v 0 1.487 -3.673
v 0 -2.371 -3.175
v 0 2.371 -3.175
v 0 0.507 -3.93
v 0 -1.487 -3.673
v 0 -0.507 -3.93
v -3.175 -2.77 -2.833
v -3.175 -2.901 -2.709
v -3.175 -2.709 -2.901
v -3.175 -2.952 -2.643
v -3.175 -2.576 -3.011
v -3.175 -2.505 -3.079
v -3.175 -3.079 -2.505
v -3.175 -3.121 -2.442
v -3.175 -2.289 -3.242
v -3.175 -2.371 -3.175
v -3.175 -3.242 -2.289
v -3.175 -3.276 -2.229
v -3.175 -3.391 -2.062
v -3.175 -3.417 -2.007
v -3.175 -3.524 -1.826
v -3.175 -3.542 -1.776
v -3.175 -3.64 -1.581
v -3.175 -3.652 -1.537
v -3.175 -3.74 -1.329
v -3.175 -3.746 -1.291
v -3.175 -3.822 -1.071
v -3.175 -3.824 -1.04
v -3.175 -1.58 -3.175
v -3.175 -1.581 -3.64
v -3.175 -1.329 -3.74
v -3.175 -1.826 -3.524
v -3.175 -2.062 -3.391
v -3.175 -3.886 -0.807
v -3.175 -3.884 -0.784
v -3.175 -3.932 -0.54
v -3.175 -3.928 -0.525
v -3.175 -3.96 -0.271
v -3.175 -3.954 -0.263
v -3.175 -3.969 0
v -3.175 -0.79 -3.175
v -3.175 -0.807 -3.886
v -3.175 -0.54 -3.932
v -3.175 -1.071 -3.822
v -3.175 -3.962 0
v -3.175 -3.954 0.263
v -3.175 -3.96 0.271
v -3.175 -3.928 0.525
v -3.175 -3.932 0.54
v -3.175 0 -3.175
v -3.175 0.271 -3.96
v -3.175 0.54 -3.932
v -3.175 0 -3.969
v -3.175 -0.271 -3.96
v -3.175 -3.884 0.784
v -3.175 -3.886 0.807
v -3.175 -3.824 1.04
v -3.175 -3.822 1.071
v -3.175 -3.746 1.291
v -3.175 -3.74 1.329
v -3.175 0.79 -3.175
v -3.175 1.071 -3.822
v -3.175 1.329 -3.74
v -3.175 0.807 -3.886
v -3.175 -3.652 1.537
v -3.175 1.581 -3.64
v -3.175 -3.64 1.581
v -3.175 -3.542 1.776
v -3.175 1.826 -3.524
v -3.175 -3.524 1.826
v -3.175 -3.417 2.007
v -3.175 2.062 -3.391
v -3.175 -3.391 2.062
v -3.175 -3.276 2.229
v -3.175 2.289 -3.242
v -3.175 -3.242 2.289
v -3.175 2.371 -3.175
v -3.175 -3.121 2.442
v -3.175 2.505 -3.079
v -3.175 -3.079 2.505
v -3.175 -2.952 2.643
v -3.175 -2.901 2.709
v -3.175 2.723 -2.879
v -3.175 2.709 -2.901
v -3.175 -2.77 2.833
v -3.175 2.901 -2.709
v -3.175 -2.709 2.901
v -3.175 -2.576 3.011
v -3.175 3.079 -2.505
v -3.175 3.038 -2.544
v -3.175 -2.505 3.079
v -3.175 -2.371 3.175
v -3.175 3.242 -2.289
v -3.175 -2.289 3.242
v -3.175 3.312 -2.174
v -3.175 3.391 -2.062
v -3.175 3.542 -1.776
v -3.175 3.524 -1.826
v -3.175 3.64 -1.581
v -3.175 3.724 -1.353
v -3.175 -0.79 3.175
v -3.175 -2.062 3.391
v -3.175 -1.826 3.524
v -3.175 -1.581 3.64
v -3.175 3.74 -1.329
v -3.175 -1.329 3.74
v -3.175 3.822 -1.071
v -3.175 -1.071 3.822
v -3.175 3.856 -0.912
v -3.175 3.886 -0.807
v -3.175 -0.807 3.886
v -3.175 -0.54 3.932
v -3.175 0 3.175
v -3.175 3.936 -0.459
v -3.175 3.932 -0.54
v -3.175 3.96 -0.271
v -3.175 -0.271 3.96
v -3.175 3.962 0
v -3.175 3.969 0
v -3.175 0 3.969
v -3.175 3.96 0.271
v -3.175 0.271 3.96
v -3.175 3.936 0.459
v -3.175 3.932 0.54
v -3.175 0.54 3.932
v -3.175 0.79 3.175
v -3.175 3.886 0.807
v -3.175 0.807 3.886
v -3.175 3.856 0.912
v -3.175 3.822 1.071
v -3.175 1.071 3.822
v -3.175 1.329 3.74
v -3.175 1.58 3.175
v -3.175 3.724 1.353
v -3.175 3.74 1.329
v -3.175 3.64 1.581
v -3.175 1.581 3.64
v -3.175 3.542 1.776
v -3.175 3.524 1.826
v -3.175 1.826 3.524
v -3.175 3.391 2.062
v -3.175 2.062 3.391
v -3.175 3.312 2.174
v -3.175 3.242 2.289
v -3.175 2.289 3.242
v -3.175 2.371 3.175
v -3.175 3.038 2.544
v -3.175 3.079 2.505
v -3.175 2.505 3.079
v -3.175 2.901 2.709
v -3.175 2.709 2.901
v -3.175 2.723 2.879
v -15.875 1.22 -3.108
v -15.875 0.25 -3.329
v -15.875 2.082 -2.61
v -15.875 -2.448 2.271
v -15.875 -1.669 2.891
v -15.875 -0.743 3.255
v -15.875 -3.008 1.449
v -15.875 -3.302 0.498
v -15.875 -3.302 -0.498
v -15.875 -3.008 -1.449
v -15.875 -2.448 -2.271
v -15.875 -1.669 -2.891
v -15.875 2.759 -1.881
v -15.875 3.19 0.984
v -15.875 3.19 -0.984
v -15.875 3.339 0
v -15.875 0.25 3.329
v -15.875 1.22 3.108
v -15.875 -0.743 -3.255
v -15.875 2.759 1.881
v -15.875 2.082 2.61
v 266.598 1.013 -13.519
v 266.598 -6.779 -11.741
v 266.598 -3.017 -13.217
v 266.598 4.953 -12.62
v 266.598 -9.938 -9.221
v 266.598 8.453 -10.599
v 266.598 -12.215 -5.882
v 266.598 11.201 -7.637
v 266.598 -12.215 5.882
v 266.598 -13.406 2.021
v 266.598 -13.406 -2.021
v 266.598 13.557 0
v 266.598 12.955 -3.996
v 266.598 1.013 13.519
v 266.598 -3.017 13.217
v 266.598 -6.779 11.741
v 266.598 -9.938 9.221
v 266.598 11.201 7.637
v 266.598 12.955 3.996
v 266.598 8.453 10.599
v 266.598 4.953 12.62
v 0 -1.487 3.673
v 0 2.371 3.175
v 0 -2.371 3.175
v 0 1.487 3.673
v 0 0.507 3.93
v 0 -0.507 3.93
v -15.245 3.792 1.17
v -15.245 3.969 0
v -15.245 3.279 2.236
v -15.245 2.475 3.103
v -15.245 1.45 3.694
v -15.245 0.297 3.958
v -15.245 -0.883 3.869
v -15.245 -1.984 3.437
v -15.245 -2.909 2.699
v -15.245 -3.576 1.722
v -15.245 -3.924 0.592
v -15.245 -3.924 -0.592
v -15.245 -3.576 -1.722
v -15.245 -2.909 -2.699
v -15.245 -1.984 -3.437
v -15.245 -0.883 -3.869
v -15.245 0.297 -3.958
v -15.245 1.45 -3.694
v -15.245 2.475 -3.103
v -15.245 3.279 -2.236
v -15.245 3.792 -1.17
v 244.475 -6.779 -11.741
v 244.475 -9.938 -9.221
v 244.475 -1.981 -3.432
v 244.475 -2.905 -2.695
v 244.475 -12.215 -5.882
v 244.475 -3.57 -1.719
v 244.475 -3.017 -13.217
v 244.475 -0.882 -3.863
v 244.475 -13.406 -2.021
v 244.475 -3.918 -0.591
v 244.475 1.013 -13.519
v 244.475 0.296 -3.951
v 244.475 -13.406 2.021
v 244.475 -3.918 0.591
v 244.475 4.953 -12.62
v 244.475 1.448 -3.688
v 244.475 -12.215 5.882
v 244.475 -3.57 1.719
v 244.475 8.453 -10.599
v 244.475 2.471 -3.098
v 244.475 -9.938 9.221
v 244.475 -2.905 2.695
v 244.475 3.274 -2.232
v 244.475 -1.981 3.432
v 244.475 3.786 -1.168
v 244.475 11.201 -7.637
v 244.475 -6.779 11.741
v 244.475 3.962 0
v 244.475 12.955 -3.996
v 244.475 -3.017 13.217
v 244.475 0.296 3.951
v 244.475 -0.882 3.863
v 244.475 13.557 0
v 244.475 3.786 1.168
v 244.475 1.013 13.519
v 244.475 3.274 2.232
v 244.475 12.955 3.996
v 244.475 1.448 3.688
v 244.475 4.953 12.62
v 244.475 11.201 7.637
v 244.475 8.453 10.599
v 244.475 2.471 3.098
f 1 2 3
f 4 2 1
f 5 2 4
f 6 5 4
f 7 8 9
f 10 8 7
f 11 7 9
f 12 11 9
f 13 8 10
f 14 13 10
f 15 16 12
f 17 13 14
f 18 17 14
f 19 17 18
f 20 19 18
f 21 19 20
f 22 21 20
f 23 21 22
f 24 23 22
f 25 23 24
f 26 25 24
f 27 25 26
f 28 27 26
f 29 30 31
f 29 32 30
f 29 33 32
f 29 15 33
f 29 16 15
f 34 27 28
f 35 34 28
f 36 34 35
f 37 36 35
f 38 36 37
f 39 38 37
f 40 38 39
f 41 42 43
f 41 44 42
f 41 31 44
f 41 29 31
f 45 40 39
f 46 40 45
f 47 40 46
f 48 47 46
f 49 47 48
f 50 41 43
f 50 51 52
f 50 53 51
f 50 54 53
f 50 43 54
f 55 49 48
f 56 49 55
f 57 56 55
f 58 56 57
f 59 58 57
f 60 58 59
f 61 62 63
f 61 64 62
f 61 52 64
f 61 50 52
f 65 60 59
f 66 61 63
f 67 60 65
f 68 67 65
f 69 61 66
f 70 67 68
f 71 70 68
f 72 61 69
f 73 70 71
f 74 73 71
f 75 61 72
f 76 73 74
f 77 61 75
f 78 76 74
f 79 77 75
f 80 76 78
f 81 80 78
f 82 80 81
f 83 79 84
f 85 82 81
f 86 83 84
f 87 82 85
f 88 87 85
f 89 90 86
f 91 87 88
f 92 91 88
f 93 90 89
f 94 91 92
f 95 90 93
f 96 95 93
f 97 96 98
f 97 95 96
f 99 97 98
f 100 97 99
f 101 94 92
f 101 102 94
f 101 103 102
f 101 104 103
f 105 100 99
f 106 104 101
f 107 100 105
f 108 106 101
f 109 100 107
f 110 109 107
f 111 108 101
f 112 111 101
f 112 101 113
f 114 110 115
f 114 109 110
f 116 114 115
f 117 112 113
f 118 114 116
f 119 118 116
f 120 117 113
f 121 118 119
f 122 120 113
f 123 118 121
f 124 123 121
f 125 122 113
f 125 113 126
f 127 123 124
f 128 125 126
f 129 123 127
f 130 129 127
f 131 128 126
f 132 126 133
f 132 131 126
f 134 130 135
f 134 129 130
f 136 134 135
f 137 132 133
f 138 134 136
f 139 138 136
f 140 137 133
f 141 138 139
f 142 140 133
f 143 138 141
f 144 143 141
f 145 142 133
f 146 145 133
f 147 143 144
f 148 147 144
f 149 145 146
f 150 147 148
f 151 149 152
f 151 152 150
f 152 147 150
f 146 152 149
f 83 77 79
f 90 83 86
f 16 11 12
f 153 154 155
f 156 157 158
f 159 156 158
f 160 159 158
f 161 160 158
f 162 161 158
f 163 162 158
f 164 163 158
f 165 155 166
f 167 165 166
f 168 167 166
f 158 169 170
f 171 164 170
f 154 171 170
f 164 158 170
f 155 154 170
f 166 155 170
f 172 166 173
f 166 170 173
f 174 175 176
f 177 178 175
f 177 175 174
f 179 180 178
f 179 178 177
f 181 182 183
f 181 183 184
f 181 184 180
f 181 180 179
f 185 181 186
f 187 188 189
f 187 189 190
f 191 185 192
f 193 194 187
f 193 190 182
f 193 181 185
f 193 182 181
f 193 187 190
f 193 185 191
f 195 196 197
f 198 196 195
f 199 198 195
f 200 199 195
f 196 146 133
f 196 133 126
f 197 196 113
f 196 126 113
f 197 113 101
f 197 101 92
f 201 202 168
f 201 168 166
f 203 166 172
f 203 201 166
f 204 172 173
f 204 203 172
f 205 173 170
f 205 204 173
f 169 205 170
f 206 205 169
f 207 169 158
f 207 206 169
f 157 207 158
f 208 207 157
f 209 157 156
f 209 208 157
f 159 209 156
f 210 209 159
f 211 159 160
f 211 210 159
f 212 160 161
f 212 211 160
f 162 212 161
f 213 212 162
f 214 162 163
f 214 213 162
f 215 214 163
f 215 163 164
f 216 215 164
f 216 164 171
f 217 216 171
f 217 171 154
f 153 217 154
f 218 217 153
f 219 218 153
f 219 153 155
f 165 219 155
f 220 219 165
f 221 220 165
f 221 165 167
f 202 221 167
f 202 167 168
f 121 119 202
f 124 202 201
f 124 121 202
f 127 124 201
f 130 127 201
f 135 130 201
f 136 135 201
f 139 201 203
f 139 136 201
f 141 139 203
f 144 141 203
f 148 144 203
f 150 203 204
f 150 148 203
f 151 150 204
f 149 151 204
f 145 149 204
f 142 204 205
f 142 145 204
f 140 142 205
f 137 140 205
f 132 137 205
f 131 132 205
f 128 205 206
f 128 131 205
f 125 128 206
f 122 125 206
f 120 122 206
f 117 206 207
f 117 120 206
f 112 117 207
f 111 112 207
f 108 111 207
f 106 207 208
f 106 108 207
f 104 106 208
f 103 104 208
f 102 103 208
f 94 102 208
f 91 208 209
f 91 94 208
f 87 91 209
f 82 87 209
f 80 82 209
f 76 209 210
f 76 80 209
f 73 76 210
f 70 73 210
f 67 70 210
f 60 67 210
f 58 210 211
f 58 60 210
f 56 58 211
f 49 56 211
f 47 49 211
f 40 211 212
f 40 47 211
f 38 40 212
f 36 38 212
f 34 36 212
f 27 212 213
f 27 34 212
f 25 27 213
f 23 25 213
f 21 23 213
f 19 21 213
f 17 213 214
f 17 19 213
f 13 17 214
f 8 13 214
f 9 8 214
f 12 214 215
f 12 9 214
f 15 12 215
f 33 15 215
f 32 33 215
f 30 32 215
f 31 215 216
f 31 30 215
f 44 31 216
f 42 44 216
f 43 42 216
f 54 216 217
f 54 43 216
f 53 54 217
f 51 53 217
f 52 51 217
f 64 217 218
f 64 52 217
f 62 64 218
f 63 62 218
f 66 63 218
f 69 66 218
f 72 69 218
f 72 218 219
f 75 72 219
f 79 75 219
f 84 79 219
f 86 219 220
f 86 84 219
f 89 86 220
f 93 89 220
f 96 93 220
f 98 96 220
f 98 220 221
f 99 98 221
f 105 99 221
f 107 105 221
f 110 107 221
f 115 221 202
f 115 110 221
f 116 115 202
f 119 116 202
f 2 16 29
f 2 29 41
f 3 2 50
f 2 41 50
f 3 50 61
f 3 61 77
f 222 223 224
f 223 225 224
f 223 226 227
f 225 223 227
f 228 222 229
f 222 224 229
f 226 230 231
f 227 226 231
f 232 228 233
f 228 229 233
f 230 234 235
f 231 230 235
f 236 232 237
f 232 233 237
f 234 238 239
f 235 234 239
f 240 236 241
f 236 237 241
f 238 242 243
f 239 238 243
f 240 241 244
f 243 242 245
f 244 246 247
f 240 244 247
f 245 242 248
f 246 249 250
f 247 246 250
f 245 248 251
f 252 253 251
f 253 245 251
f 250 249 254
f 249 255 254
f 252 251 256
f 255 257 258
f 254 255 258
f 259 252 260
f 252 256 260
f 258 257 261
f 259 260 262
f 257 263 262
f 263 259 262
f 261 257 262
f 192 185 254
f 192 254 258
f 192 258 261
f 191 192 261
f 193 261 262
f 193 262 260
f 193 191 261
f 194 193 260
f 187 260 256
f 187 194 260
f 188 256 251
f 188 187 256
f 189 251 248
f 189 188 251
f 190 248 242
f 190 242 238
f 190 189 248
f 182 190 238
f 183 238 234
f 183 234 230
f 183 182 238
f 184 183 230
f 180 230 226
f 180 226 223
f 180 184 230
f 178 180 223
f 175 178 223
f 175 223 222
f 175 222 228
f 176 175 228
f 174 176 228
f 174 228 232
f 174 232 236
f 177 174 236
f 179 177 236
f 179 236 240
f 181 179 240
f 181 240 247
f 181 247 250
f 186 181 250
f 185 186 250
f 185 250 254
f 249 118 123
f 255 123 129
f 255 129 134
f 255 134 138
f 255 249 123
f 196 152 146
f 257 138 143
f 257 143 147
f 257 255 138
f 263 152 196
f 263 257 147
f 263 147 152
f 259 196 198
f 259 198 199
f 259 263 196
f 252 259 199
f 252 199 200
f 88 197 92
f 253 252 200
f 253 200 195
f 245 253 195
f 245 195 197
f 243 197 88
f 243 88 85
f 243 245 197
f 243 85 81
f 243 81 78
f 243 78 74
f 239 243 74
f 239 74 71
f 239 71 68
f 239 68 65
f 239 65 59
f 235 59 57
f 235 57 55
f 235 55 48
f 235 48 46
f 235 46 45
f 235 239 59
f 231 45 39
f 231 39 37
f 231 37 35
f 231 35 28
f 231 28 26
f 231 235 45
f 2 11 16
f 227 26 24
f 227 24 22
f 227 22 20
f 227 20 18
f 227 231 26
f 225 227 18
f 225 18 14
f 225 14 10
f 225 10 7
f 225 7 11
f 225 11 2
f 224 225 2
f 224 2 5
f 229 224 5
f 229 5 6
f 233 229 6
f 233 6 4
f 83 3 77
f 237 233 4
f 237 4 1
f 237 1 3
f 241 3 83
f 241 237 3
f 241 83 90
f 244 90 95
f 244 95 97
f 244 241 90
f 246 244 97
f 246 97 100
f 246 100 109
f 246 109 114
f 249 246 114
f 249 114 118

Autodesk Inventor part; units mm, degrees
sketch "Sketch_1" plane through (0, 0, 0) normal (0, 0, 1) x (1, 0, 0)
  line L0 (266.5984, 0) -> (-3.175, 0)
  line L1 (-3.175, 0) -> (-3.175, 3.9624)
  line L2 (-3.175, 3.9624) -> (244.475, 3.9624)
  line L3 (244.475, 3.9624) -> (244.475, 13.5572)
  line L4 (244.475, 13.5572) -> (266.5984, 13.5572)
  line L5 (266.5984, 13.5572) -> (266.5984, 0)
  line L6 (266.5984, 0) -> (-3.175, 0)
revolve "Revolution1" add sketch "Sketch_1" angle 360 about axis through (266.5984, 0, 0) along (1, 0, 0)
sketch "Sketch_3" plane through (0, 0, 0) normal (0, 0, 1) x (1, 0, 0)
  line L0 (-3.175, 0) -> (-15.875, 0)
  line L1 (-15.875, 0) -> (-15.875, 3.3388)
  line L2 (-15.875, 3.3388) -> (-15.2451, 3.9688)
  line L3 (-15.2451, 3.9688) -> (-3.175, 3.9688)
  line L4 (-3.175, 3.9688) -> (-3.175, 0)
  line L5 (-3.175, 0) -> (-15.875, 0)
revolve "Revolution2" add sketch "Sketch_3" angle 360 about axis through (-3.175, 0, 0) along (1, 0, 0)
thread "Thread1" size "5/16-24 UNF" class "2A" standard "ANSI Unified Screw Threads" full length
sketch "Sketch_10" plane through (-3.175, 0, 0) normal (1, 0, 0) x (0, 0, -1)
  line L0 (-7.9248, 7.9248) -> (-7.9248, -7.9248)
  line L1 (-7.9248, -7.9248) -> (7.9248, -7.9248)
  line L2 (7.9248, -7.9248) -> (7.9248, 7.9248)
  line L3 (7.9248, 7.9248) -> (-7.9248, 7.9248)
  line L4 (-3.175, 3.9624) -> (-3.175, -3.9624)
  line L5 (-3.175, -3.9624) -> (3.175, -3.9624)
  line L6 (3.175, -3.9624) -> (3.175, 3.9624)
  line L7 (3.175, 3.9624) -> (-3.175, 3.9624)
extrude "Extrusion1" cut sketch "Sketch_10" along normal blind 3.175
ref_plane "dia1_XY" through (-3.175, 3.9624, 0) normal (1, 0, 0) x (0, 0, -1)
ref_plane "dia1_YZ" through (-3.175, 3.9624, 0) normal (0, 0, -1) x (0, 1, 0)
ref_plane "dia1_ZX" through (-3.175, 3.9624, 0) normal (0, 1, 0) x (1, 0, 0)
ref_plane "dia12_XY" through (0, 0, 14.1351) normal (1, 0, 0) x (0, 0, -1)
ref_plane "dia12_YZ" through (0, 0, 14.1351) normal (0, 0, -1) x (0, 1, 0)
ref_plane "dia12_ZX" through (0, 0, 14.1351) normal (0, 1, 0) x (1, 0, 0)
ref_plane "dia2_XY" through (-3.175, -3.9624, 0) normal (1, 0, 0) x (0, 0, -1)
ref_plane "dia2_YZ" through (-3.175, -3.9624, 0) normal (0, 0, -1) x (0, 1, 0)
ref_plane "dia2_ZX" through (-3.175, -3.9624, 0) normal (0, 1, 0) x (1, 0, 0)
ref_plane "dia22_XY" through (0, 0, -14.1351) normal (1, 0, 0) x (0, 0, -1)
ref_plane "dia22_YZ" through (0, 0, -14.1351) normal (0, 0, -1) x (0, 1, 0)
ref_plane "dia22_ZX" through (0, 0, -14.1351) normal (0, 1, 0) x (1, 0, 0)
ref_plane "rl1_XY" through (-15.875, 0, 0) normal (1, 0, 0) x (0, 0, -1)
ref_plane "rl1_YZ" through (-15.875, 0, 0) normal (0, 0, -1) x (0, 1, 0)
ref_plane "rl1_ZX" through (-15.875, 0, 0) normal (0, 1, 0) x (1, 0, 0)
ref_plane "rl2_XY" through (-3.175, 0, 0) normal (1, 0, 0) x (0, 0, -1)
ref_plane "rl2_YZ" through (-3.175, 0, 0) normal (0, 0, -1) x (0, 1, 0)
ref_plane "rl2_ZX" through (-3.175, 0, 0) normal (0, 1, 0) x (1, 0, 0)
ref_plane "rod_cp_XY" through (0, 0, 0) normal (1, 0, 0) x (0, 0, -1)
ref_plane "rod_cp_YZ" through (0, 0, 0) normal (0, 0, -1) x (0, 1, 0)
ref_plane "rod_cp_ZX" through (0, 0, 0) normal (0, 1, 0) x (1, 0, 0)
ref_plane "thd1_XY" through (-15.875, 3.9688, 0) normal (1, 0, 0) x (0, 0, -1)
ref_plane "thd1_YZ" through (-15.875, 3.9688, 0) normal (0, 0, -1) x (0, 1, 0)
ref_plane "thd1_ZX" through (-15.875, 3.9688, 0) normal (0, 1, 0) x (1, 0, 0)
ref_plane "thd2_XY" through (-15.875, -3.9688, 0) normal (1, 0, 0) x (0, 0, -1)
ref_plane "thd2_YZ" through (-15.875, -3.9688, 0) normal (0, 0, -1) x (0, 1, 0)
ref_plane "thd2_ZX" through (-15.875, -3.9688, 0) normal (0, 1, 0) x (1, 0, 0)
ref_plane "to_rod_clevis_XY" through (-20.701, 0, 0) normal (1, 0, 0) x (0, 0, -1)
ref_plane "to_rod_clevis_YZ" through (-20.701, 0, 0) normal (0, 0, -1) x (0, 1, 0)
ref_plane "to_rod_clevis_ZX" through (-20.701, 0, 0) normal (0, 1, 0) x (1, 0, 0)
ref_plane "wf1_XY" through (-3.175, 0, 0) normal (1, 0, 0) x (0, 0, -1)
ref_plane "wf1_YZ" through (-3.175, 0, 0) normal (0, 0, -1) x (0, 1, 0)
ref_plane "wf1_ZX" through (-3.175, 0, 0) normal (0, 1, 0) x (1, 0, 0)
ref_plane "wf2_XY" through (0, 0, 0) normal (1, 0, 0) x (0, 0, -1)
ref_plane "wf2_YZ" through (0, 0, 0) normal (0, 0, -1) x (0, 1, 0)
ref_plane "wf2_ZX" through (0, 0, 0) normal (0, 1, 0) x (1, 0, 0)
ref_plane "wfw1_XY" through (-3.175, 0, -3.175) normal (0, 1, 0) x (1, 0, 0)
ref_plane "wfw1_YZ" through (-3.175, 0, -3.175) normal (1, 0, 0) x (0, 0, -1)
ref_plane "wfw1_ZX" through (-3.175, 0, -3.175) normal (0, 0, -1) x (0, 1, 0)
ref_plane "wfw2_XY" through (-3.175, 0, 3.175) normal (0, 1, 0) x (1, 0, 0)
ref_plane "wfw2_YZ" through (-3.175, 0, 3.175) normal (1, 0, 0) x (0, 0, -1)
ref_plane "wfw2_ZX" through (-3.175, 0, 3.175) normal (0, 0, -1) x (0, 1, 0)
properties part number "C-098-DP0_rod"
